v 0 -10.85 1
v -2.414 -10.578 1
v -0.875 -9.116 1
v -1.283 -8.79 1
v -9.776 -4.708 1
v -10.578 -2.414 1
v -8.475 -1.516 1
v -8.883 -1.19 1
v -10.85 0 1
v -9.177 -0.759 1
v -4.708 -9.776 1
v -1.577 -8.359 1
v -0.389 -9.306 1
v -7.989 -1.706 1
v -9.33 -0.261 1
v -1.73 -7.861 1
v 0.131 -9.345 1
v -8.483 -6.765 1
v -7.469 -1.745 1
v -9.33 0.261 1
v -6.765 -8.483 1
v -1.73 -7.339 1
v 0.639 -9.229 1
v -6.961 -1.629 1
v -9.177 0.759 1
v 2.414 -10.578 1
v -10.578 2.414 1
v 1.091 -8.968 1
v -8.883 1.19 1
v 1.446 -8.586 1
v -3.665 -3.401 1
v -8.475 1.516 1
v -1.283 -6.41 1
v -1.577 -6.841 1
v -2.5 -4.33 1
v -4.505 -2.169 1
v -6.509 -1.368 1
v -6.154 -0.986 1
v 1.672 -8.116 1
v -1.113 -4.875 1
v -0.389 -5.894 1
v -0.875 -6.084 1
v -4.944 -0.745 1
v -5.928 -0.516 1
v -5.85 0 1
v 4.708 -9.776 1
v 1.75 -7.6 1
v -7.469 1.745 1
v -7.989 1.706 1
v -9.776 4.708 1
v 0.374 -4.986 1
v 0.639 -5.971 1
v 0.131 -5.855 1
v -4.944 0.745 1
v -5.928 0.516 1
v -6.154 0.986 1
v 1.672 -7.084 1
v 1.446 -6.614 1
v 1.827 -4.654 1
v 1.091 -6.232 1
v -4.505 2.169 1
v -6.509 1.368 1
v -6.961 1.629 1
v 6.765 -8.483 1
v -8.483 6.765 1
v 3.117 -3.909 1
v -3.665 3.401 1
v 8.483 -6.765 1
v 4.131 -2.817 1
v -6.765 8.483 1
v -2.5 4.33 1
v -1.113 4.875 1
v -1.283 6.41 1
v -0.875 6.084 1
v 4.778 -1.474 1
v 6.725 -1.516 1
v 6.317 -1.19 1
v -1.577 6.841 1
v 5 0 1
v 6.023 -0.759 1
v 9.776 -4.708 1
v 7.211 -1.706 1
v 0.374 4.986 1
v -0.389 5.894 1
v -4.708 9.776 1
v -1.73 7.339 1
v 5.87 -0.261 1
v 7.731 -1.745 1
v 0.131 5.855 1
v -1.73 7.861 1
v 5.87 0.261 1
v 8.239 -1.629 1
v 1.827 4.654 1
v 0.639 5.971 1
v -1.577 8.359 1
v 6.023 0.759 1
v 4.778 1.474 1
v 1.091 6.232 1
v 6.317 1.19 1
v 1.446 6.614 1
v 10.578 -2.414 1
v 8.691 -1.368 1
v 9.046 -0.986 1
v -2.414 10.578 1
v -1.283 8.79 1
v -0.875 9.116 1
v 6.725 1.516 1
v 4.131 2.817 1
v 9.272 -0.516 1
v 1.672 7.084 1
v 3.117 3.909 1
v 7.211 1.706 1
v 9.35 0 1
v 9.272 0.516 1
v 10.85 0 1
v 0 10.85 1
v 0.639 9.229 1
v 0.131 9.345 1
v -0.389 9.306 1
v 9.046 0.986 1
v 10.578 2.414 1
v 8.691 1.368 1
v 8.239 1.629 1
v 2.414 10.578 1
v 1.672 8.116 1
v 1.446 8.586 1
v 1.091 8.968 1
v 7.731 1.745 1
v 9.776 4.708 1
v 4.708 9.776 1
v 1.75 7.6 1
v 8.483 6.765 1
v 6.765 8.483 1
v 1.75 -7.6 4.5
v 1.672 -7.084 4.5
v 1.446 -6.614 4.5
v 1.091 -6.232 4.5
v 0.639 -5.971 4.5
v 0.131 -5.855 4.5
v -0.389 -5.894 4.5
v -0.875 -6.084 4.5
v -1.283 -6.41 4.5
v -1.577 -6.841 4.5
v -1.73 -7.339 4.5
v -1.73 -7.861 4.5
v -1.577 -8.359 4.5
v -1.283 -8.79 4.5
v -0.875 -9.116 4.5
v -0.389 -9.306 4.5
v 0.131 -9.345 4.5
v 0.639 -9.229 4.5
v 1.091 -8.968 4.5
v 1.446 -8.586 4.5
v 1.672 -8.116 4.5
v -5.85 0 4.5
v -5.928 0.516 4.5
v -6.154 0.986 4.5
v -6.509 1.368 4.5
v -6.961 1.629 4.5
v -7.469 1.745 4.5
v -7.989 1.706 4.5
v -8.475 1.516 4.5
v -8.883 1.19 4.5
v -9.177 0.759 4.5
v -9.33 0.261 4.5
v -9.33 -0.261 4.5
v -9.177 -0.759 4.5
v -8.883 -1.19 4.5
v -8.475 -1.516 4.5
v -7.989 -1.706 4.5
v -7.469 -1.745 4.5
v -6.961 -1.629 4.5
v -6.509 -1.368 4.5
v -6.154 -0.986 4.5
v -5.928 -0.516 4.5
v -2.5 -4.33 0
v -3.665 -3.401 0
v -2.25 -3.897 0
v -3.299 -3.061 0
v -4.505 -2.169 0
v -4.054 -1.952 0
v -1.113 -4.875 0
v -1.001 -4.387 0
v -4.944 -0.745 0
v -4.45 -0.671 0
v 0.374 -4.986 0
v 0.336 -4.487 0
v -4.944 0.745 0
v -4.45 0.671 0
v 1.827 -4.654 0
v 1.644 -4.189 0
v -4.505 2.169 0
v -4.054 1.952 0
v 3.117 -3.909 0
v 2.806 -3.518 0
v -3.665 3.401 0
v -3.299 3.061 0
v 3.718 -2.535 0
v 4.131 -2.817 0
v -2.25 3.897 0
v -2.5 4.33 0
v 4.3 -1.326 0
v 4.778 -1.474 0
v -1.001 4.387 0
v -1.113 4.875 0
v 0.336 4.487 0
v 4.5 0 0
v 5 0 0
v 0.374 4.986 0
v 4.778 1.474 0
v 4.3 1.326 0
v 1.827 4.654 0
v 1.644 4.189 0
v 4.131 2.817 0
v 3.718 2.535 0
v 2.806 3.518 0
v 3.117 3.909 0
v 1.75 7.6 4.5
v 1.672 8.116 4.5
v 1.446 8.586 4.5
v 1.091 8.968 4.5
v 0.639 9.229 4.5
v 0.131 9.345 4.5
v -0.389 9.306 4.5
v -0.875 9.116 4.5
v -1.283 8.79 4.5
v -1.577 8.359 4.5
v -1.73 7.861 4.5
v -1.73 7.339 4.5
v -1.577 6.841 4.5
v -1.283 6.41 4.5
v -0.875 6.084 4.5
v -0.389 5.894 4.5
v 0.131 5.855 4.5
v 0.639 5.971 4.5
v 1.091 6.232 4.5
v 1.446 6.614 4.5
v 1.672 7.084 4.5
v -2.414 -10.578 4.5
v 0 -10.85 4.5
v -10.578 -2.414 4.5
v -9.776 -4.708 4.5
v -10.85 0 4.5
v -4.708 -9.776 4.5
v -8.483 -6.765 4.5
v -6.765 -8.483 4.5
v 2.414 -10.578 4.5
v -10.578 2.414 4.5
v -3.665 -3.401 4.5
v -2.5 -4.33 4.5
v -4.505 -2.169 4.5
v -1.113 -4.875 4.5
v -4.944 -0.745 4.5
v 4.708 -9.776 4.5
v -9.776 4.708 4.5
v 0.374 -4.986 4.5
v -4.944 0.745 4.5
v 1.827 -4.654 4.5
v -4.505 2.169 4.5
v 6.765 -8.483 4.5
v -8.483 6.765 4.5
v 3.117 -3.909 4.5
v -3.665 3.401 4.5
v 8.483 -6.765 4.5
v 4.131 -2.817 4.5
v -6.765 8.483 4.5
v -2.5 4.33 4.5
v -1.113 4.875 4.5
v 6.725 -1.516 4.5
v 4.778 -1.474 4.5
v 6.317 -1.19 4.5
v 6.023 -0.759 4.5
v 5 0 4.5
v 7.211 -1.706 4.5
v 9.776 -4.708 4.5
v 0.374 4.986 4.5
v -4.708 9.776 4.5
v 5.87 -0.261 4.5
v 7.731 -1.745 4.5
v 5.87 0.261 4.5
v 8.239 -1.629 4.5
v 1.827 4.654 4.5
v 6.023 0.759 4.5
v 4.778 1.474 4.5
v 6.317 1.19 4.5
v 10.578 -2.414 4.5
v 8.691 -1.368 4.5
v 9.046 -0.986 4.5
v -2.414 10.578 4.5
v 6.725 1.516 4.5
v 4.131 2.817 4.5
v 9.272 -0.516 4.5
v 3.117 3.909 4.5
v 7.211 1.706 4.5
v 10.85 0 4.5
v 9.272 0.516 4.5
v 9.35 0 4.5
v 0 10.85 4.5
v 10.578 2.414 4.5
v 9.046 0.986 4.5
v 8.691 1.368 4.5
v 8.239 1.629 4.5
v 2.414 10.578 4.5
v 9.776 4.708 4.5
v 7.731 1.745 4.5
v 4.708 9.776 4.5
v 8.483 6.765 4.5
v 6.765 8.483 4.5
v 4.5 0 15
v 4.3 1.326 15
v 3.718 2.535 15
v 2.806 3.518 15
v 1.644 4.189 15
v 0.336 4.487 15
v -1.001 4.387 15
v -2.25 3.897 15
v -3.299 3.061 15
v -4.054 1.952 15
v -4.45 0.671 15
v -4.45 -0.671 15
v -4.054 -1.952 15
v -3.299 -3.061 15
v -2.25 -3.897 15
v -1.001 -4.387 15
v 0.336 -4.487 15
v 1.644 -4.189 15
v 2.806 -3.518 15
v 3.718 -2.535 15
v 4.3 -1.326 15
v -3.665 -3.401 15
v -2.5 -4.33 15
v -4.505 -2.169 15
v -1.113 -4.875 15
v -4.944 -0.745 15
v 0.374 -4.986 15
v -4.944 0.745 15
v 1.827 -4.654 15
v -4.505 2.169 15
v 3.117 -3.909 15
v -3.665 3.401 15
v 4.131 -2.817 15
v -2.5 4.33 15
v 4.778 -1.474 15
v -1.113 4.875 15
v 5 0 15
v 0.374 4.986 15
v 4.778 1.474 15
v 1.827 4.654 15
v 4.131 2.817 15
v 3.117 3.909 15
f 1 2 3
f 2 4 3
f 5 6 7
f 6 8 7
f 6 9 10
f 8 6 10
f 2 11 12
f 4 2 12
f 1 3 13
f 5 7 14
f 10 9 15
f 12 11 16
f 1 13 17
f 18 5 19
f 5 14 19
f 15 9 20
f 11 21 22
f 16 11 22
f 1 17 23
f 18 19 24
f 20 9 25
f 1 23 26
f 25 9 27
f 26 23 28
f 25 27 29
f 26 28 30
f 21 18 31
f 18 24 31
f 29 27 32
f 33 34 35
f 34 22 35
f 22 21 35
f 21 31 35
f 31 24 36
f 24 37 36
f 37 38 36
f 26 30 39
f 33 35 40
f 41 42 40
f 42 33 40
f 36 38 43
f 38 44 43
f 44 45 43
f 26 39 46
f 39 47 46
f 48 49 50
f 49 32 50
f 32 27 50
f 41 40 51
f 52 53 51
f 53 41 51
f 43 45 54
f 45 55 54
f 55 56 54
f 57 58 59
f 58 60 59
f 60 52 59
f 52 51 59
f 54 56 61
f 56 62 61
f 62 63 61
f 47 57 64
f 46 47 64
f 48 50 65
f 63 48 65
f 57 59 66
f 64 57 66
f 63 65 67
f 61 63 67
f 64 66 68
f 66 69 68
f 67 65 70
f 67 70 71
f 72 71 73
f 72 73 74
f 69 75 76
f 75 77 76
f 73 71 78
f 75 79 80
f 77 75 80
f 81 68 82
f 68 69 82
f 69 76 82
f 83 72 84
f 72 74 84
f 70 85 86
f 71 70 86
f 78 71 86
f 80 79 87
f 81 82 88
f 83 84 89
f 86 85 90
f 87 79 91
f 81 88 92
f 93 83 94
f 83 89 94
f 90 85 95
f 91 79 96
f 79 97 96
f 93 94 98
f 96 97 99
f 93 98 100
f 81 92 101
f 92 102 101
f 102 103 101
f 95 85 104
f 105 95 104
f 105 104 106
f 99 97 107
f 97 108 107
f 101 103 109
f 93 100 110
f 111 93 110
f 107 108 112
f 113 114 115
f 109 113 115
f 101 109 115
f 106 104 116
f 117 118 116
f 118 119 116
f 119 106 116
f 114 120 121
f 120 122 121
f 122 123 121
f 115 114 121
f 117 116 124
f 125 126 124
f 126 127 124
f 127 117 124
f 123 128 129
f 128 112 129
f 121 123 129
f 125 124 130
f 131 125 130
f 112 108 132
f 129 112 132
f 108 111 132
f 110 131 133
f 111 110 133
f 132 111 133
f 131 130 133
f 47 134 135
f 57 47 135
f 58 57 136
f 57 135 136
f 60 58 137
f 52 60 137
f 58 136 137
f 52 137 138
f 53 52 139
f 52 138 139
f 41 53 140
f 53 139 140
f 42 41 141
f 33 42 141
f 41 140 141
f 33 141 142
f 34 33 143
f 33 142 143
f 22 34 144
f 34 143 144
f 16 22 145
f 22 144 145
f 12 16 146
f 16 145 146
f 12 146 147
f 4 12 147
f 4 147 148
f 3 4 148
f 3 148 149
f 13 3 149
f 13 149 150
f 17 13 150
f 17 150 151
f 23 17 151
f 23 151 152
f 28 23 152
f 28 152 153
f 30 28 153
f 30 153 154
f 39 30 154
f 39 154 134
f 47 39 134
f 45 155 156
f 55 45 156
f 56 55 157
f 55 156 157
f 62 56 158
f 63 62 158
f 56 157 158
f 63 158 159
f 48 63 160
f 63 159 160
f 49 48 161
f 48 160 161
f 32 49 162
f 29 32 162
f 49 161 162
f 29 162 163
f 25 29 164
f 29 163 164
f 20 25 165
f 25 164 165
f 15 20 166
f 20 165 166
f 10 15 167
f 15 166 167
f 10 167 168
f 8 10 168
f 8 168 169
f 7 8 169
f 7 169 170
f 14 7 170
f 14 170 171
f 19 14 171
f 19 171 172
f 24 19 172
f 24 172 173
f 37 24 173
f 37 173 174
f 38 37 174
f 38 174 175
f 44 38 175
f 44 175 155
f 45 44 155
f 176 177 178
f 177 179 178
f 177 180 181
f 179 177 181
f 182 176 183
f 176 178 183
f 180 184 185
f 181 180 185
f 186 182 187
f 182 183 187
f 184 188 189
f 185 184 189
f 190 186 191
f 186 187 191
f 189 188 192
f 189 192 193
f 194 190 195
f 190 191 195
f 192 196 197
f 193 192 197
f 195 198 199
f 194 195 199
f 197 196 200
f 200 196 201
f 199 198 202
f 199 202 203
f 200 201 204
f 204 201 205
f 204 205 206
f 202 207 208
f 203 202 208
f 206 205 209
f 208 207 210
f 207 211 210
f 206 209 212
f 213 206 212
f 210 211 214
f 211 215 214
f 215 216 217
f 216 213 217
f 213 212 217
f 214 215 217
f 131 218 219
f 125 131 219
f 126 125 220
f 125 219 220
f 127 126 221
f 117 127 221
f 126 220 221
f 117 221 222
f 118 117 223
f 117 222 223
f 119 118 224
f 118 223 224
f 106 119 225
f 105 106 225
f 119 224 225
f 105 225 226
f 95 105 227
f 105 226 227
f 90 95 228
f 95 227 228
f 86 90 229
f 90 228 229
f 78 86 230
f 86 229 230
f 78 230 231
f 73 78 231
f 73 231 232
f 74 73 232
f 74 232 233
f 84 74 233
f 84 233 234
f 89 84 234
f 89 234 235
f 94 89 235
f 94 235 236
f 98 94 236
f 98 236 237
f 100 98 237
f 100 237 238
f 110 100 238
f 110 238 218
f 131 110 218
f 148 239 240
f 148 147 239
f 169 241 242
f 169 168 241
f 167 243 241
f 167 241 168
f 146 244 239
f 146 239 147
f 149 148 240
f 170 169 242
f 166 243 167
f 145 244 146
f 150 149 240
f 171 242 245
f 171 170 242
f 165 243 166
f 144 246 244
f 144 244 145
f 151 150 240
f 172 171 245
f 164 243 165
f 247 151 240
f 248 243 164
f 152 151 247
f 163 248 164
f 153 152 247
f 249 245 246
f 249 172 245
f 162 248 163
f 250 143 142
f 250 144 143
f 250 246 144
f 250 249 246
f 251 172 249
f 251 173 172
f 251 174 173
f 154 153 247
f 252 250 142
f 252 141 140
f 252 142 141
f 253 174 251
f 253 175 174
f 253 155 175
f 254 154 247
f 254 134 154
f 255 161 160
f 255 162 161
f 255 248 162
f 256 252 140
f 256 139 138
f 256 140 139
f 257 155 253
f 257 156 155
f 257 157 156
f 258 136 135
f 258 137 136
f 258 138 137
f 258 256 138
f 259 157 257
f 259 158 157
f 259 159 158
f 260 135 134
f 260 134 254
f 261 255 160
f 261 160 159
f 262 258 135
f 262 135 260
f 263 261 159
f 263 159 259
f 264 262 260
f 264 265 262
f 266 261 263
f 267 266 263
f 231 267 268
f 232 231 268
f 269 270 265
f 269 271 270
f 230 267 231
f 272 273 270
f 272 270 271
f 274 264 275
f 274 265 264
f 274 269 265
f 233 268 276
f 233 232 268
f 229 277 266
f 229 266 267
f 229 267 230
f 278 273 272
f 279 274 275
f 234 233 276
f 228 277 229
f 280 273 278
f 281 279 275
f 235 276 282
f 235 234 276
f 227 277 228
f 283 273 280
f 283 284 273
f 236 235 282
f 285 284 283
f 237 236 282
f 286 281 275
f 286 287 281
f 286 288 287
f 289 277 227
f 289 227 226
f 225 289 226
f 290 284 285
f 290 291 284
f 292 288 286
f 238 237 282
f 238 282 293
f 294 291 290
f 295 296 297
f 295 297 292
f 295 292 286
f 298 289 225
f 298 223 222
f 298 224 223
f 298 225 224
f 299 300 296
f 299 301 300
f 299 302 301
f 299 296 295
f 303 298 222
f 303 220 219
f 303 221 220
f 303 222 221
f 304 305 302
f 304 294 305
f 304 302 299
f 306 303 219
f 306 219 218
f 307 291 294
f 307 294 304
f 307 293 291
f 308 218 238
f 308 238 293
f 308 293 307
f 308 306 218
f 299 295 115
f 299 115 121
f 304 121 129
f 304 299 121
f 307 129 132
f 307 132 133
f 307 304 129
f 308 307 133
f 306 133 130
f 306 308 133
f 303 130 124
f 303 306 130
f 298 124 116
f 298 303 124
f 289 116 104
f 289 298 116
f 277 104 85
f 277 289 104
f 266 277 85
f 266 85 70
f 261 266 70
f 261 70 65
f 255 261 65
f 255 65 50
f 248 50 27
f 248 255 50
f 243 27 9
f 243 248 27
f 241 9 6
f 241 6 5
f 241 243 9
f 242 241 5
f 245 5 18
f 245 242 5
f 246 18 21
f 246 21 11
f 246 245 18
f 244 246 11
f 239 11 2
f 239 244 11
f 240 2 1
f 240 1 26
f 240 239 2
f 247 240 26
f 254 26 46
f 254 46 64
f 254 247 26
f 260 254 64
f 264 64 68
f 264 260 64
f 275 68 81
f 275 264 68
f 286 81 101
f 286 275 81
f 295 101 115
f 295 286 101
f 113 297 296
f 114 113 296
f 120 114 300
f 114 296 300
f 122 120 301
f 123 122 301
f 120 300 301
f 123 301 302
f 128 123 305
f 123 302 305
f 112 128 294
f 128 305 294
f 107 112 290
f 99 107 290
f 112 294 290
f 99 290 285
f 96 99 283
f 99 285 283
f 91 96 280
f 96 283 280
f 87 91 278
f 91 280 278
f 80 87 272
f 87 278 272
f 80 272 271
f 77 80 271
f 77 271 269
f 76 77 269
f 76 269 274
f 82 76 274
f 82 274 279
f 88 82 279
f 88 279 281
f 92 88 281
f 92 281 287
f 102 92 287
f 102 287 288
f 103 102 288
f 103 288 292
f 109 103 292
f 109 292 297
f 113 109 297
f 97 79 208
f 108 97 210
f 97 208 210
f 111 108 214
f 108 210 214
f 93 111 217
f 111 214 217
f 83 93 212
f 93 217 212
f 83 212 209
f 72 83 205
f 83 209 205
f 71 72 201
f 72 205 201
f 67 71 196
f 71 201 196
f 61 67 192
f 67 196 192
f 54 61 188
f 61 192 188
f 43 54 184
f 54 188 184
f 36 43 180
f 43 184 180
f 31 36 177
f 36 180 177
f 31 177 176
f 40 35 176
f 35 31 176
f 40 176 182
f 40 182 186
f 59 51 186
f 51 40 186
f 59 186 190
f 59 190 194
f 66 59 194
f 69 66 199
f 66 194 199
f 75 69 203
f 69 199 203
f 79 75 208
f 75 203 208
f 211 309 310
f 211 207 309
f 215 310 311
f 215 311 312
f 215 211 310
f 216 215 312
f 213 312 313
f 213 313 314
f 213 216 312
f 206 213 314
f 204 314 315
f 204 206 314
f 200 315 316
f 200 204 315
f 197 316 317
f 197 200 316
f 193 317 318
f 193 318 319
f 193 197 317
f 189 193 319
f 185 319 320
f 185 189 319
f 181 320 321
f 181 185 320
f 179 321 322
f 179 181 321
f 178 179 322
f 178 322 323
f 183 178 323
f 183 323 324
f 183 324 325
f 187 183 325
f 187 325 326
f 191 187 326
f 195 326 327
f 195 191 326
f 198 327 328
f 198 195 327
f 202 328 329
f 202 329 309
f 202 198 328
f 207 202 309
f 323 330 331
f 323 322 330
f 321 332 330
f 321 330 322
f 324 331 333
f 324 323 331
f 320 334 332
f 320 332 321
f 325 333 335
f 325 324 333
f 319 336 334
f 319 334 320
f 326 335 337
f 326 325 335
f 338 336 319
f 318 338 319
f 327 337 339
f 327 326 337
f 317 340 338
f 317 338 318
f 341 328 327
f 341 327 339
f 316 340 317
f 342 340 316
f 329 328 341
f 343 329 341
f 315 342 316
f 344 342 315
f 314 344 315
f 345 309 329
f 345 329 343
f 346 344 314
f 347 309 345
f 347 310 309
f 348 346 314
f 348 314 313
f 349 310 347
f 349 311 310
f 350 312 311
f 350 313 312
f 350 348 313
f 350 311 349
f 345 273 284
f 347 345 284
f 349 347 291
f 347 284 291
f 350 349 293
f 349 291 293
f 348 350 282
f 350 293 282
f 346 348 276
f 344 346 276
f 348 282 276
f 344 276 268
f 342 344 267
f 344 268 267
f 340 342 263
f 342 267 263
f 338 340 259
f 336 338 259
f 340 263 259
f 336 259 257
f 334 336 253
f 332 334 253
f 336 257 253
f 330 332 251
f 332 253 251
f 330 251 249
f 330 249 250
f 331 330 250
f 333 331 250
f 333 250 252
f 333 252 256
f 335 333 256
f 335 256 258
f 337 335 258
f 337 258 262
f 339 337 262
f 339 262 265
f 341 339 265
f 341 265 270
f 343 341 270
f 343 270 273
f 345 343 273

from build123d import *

# Parameters (mm, degrees)
SKETCH1_R           = 5
SKETCH1_R_2         = 4.5
BOSS_EXTRUDE1_DEPTH = 15
SKETCH2_R           = 10.85
BOSS_EXTRUDE2_DEPTH = 3.5
SKETCH4_R           = 1.75
CUT_EXTRUDE1_DEPTH  = 15.5
SKETCH5_R           = 4.5
CUT_EXTRUDE2_DEPTH  = 15.5


with BuildPart() as part:
    # Sketch1 → Boss-Extrude1 (new body)
    with BuildSketch(Plane.XY):
        Circle(SKETCH1_R)
        Circle(SKETCH1_R_2, mode=Mode.SUBTRACT)
    extrude(amount=BOSS_EXTRUDE1_DEPTH)

    # Sketch2 → Boss-Extrude2 (add)
    with BuildSketch(Plane.XY.offset(4.5)):
        Circle(SKETCH2_R)
    extrude(amount=-BOSS_EXTRUDE2_DEPTH)

    # Sketch4 → Cut-Extrude1 (cut)
    with BuildSketch(Plane.XY.offset(4.5)):
        with Locations((0, 7.6)):
            Circle(SKETCH4_R)
        with Locations((7.6, 0)):
            Circle(SKETCH4_R)
        with Locations((0, -7.6)):
            Circle(SKETCH4_R)
        with Locations((-7.6, 0)):
            Circle(SKETCH4_R)
    extrude(amount=-CUT_EXTRUDE1_DEPTH, mode=Mode.SUBTRACT)

    # Sketch5 → Cut-Extrude2 (cut)
    with BuildSketch(Plane(origin=(0, 0, 1), x_dir=(-1, 0, 0), z_dir=(0, 0, -1))):
        with Locations(Location((0, 0, 0), (0, 0, 180))):
            Circle(SKETCH5_R)
    extrude(amount=-CUT_EXTRUDE2_DEPTH, mode=Mode.SUBTRACT)


solid = part.part
